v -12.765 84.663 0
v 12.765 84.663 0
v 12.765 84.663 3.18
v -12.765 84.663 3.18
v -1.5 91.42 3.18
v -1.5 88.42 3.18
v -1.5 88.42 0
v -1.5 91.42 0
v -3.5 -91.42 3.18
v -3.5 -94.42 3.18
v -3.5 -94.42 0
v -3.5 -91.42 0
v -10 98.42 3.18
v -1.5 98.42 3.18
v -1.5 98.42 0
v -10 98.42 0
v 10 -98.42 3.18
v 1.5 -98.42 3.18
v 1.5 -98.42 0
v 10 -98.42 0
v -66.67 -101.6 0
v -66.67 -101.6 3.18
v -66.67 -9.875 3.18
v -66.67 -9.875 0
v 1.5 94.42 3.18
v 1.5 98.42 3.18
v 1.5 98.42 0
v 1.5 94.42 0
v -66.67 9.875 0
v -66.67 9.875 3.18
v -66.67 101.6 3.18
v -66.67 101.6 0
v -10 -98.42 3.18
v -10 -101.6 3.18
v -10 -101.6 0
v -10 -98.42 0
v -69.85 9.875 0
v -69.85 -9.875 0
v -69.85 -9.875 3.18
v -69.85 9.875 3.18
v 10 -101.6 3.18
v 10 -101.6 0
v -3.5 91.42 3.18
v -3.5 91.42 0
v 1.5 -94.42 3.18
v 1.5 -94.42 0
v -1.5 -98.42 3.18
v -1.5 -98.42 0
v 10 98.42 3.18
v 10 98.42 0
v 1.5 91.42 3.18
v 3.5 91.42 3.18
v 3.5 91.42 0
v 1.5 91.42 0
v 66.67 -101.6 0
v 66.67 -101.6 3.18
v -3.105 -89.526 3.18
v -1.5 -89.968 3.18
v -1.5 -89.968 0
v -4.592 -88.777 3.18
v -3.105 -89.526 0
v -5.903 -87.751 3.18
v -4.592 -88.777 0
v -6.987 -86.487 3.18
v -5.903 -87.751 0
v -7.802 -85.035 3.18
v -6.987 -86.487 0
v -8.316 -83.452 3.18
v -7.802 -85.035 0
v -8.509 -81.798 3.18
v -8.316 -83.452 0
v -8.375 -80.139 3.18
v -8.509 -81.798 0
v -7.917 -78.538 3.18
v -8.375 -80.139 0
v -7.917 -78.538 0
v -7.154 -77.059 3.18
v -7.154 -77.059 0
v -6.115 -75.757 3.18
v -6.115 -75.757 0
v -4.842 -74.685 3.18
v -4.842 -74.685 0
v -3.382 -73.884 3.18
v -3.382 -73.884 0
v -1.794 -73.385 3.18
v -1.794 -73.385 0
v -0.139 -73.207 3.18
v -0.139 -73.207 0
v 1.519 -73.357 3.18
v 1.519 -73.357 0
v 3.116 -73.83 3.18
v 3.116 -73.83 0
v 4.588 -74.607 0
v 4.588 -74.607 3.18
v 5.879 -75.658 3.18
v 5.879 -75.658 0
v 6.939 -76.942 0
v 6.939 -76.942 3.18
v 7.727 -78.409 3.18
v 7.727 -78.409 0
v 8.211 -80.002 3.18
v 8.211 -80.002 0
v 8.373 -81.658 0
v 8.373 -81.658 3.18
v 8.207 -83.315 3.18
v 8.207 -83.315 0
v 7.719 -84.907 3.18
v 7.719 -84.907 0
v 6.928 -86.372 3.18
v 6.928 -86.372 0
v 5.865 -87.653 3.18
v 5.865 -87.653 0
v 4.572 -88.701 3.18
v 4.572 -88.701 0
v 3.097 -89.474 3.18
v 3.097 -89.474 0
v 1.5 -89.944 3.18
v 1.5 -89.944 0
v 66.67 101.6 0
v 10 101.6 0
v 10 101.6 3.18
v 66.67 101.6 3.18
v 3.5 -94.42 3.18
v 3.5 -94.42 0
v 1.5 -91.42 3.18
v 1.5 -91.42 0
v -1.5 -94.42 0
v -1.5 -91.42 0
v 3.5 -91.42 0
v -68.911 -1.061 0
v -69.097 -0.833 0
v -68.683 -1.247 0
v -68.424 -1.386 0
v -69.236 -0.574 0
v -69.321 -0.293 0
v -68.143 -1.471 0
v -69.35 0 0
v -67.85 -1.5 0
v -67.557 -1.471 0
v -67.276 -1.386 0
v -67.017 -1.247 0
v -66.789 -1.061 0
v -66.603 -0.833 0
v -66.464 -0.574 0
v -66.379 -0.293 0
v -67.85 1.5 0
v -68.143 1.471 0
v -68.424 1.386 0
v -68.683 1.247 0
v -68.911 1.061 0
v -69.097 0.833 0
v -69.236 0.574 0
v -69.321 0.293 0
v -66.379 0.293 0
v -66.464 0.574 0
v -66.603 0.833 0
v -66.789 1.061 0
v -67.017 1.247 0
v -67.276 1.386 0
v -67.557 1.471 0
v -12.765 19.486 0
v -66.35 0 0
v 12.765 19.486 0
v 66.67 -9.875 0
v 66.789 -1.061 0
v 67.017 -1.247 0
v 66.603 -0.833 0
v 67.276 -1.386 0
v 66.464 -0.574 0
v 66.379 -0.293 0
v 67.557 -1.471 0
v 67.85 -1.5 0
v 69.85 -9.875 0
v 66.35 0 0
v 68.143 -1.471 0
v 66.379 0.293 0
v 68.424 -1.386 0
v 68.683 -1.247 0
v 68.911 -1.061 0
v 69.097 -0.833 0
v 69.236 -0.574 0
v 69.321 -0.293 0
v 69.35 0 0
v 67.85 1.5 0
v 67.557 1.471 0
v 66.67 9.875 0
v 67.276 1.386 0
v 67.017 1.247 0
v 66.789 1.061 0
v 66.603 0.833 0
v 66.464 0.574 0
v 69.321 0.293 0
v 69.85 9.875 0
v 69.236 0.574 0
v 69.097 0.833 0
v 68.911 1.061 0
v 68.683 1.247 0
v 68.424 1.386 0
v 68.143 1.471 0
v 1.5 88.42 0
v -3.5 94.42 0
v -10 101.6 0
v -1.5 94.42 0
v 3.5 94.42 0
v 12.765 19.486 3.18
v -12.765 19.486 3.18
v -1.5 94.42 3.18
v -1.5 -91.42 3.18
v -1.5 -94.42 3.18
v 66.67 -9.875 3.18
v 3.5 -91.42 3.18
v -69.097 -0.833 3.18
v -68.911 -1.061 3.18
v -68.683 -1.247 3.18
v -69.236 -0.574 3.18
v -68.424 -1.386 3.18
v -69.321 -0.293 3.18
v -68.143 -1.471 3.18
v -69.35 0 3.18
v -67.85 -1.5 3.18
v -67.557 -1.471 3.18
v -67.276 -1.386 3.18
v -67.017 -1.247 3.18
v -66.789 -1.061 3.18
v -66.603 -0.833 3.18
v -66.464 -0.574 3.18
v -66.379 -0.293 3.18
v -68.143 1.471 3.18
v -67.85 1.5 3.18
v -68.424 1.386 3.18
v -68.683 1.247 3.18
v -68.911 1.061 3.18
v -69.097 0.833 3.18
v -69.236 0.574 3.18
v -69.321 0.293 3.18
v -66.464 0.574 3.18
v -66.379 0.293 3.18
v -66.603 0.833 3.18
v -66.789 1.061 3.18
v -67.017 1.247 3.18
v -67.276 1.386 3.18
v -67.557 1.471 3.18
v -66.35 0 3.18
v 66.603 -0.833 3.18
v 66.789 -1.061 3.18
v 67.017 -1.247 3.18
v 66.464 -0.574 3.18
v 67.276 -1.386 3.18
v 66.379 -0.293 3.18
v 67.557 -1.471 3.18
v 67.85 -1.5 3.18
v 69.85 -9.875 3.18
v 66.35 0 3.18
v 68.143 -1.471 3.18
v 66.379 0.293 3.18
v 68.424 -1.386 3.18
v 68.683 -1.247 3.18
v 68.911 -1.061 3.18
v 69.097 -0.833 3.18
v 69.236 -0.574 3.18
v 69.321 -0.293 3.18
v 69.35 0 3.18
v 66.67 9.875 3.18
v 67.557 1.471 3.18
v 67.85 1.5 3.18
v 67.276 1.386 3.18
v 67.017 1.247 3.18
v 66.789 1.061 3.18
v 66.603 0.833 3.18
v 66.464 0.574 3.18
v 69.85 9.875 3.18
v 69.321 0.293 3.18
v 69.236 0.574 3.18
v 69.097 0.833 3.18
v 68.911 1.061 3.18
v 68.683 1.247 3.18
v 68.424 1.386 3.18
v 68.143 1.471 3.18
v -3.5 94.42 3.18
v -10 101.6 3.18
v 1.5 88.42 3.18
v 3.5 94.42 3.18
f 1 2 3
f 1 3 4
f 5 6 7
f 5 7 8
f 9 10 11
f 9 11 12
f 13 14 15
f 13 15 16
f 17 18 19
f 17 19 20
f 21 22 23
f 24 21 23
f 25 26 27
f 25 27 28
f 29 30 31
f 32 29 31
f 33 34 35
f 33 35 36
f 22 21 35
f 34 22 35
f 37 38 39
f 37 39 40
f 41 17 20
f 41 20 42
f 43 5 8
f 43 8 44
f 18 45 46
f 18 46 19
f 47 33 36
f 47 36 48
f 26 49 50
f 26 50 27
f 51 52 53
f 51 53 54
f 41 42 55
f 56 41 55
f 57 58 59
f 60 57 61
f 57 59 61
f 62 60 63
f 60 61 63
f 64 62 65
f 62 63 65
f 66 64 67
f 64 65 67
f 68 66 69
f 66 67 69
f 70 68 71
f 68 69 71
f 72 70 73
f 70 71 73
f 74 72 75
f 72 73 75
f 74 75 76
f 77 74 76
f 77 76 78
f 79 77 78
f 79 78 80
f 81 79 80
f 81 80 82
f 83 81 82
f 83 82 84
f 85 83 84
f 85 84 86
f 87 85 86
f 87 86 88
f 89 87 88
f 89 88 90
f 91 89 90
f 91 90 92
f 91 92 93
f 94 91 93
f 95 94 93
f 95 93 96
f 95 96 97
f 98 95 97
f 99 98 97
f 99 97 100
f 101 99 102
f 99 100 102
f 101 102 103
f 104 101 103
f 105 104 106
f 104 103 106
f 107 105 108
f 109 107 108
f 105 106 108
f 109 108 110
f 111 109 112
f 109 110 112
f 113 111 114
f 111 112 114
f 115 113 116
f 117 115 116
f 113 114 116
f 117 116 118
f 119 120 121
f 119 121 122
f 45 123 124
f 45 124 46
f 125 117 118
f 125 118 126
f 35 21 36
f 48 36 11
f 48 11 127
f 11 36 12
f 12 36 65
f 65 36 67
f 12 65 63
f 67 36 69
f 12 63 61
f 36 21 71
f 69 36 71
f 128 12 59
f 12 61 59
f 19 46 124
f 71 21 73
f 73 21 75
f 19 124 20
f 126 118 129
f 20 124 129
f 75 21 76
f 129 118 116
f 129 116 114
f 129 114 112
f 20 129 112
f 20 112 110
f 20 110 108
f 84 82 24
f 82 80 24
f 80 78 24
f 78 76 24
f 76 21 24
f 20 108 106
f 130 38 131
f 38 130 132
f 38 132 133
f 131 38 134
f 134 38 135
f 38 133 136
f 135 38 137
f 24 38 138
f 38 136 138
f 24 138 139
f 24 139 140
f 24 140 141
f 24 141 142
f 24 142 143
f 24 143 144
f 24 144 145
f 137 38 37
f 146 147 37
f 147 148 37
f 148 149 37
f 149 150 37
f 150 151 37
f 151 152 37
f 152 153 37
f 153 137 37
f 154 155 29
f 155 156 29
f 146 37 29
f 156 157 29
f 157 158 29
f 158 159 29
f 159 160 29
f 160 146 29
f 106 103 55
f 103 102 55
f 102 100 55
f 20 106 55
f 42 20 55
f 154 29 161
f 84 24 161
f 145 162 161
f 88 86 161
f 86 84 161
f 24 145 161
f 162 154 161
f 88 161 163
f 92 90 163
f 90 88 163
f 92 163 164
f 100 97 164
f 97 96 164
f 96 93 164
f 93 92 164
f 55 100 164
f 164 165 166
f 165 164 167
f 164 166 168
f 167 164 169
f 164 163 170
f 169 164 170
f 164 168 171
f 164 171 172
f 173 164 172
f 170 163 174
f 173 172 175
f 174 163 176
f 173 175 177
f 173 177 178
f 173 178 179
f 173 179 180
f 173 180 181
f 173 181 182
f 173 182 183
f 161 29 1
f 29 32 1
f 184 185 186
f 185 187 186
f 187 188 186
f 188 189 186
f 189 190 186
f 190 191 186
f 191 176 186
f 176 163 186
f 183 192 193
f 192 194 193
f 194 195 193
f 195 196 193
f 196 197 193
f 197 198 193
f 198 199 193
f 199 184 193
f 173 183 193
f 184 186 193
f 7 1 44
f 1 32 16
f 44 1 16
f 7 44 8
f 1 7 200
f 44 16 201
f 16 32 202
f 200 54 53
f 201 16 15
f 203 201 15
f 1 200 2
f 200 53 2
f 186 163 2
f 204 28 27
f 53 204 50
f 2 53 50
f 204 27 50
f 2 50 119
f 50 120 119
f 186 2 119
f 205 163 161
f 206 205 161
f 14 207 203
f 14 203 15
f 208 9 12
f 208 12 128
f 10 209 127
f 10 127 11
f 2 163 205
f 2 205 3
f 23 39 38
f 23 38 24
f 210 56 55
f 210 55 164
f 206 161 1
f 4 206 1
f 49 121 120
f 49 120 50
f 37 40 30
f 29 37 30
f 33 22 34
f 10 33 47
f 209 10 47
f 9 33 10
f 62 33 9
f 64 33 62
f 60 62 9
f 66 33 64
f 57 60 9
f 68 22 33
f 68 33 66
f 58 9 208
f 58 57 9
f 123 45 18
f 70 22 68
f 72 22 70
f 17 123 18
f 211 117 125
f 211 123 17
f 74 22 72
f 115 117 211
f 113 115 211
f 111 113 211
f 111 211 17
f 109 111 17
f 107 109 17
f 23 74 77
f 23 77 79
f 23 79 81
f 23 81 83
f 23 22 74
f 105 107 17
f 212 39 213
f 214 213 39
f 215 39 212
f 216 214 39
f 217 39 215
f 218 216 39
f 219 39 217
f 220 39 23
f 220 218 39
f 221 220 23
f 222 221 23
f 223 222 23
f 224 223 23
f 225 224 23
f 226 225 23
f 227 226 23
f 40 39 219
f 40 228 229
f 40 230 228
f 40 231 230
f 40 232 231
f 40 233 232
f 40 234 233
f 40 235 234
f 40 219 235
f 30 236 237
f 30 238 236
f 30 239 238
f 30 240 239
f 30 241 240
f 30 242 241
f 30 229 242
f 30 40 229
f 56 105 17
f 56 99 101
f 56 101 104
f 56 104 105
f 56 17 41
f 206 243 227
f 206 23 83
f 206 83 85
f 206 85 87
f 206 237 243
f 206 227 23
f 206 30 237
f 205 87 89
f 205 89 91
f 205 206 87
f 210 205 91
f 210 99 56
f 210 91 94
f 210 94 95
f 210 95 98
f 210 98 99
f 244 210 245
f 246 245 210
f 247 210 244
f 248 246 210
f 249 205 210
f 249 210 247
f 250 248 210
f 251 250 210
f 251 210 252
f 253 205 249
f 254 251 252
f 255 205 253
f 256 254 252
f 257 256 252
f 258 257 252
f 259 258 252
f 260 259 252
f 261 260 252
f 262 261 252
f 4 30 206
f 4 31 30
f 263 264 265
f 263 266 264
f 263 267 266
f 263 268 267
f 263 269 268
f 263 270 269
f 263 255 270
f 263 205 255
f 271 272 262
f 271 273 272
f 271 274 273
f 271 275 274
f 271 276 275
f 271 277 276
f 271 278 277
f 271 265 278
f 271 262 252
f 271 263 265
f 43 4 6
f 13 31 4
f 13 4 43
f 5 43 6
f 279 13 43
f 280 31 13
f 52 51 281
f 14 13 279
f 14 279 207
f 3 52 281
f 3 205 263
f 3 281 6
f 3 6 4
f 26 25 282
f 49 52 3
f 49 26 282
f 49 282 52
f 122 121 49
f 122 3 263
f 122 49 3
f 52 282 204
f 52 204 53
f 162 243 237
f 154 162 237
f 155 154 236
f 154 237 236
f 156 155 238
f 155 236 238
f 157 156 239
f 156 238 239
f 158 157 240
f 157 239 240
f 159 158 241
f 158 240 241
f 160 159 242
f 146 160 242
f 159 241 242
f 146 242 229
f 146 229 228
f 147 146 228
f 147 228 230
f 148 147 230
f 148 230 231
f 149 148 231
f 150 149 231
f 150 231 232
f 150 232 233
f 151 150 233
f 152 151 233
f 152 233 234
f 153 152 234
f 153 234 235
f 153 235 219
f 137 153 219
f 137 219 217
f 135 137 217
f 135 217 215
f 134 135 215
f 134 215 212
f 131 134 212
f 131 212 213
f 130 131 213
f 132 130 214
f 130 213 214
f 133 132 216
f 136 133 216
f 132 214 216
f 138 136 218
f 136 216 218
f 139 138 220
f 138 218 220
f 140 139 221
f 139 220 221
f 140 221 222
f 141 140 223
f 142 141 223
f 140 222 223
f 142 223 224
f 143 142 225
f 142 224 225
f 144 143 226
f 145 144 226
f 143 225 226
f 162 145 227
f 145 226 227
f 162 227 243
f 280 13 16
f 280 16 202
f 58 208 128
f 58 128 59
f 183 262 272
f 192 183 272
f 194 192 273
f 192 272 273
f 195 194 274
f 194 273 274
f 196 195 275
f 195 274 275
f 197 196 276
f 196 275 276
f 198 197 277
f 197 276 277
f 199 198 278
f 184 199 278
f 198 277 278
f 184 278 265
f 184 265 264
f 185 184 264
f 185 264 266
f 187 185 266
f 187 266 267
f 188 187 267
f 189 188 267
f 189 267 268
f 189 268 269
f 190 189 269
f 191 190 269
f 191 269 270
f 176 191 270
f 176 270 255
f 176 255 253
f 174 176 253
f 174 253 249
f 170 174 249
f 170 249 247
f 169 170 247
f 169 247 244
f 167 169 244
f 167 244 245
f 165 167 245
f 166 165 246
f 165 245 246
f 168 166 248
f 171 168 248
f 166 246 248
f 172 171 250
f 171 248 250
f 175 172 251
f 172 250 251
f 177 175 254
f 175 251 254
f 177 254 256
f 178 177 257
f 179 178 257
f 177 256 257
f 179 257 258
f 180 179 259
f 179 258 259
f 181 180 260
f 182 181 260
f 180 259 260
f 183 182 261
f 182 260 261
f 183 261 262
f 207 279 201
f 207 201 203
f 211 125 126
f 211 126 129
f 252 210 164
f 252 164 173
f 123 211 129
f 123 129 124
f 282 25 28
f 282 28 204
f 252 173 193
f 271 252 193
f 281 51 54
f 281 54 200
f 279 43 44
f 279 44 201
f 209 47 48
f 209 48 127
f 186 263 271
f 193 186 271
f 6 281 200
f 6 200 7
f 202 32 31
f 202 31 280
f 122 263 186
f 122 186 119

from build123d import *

# Parameters (mm, degrees)
SKETCH1_W           = 139.7
SKETCH1_H           = 203.2
BOSS_EXTRUDE1_DEPTH = 3.18
SKETCH2_R           = 1.5
SKETCH2_W           = 3.18
SKETCH2_H           = 91.725
CUT_EXTRUDE1_DEPTH  = 124.335700022
SKETCH3_R           = 8.441994665
CUT_EXTRUDE2_DEPTH  = 10
SKETCH5_W           = 25.530623926
SKETCH5_H           = 65.176444071
CUT_EXTRUDE3_DEPTH  = 10


with BuildPart() as part:
    # Sketch1 → Boss-Extrude1 (new body)
    with BuildSketch(Plane.XY):
        Rectangle(SKETCH1_W, SKETCH1_H)
    extrude(amount=BOSS_EXTRUDE1_DEPTH)

    # Sketch2 → Cut-Extrude1 (cut, through all)
    with BuildSketch(Plane.XY.offset(3.18)):
        with Locations((-67.85, 0)):
            Circle(SKETCH2_R)
        with Locations((67.85, 0)):
            Circle(SKETCH2_R)
        Polygon((-10, 101.6), (10, 101.6), (10, 98.42), (1.5, 98.42), (1.5, 94.42), (3.5, 94.42), (3.5, 91.42), (1.5, 91.42), (1.5, 88.42), (-1.5, 88.42), (-1.5, 91.42), (-3.5, 91.42), (-3.5, 94.42), (-1.5, 94.42), (-1.5, 98.42), (-10, 98.42), align=None)
        Polygon((-10, -101.6), (-10, -98.42), (-1.5, -98.42), (-1.5, -94.42), (-3.5, -94.42), (-3.5, -91.42), (-1.5, -91.42), (-1.5, -88.42), (1.5, -88.42), (1.5, -91.42), (3.5, -91.42), (3.5, -94.42), (1.5, -94.42), (1.5, -98.42), (10, -98.42), (10, -101.6), align=None)
        with Locations((-68.26, 55.7375)):
            Rectangle(SKETCH2_W, SKETCH2_H)
        with Locations((-68.26, -55.7375)):
            Rectangle(SKETCH2_W, SKETCH2_H)
        with Locations((68.26, -55.7375)):
            Rectangle(SKETCH2_W, SKETCH2_H)
        with Locations((68.26, 55.7375)):
            Rectangle(SKETCH2_W, SKETCH2_H)
    extrude(amount=-CUT_EXTRUDE1_DEPTH, mode=Mode.SUBTRACT)

    # Sketch3 → Cut-Extrude2 (cut)
    with BuildSketch(Plane(origin=(0, 0, 0), x_dir=(-1, 0, 0), z_dir=(0, 0, -1))):
        with Locations((0.068813102, -81.648638462)):
            Circle(SKETCH3_R)
    extrude(amount=-CUT_EXTRUDE2_DEPTH, mode=Mode.SUBTRACT)

    # Sketch5 → Cut-Extrude3 (cut)
    with BuildSketch(Plane(origin=(0, 0, 0), x_dir=(-1, 0, 0), z_dir=(0, 0, -1))):
        with Locations((0, 52.074409839)):
            Rectangle(SKETCH5_W, SKETCH5_H)
    extrude(amount=-CUT_EXTRUDE3_DEPTH, mode=Mode.SUBTRACT)


solid = part.part
